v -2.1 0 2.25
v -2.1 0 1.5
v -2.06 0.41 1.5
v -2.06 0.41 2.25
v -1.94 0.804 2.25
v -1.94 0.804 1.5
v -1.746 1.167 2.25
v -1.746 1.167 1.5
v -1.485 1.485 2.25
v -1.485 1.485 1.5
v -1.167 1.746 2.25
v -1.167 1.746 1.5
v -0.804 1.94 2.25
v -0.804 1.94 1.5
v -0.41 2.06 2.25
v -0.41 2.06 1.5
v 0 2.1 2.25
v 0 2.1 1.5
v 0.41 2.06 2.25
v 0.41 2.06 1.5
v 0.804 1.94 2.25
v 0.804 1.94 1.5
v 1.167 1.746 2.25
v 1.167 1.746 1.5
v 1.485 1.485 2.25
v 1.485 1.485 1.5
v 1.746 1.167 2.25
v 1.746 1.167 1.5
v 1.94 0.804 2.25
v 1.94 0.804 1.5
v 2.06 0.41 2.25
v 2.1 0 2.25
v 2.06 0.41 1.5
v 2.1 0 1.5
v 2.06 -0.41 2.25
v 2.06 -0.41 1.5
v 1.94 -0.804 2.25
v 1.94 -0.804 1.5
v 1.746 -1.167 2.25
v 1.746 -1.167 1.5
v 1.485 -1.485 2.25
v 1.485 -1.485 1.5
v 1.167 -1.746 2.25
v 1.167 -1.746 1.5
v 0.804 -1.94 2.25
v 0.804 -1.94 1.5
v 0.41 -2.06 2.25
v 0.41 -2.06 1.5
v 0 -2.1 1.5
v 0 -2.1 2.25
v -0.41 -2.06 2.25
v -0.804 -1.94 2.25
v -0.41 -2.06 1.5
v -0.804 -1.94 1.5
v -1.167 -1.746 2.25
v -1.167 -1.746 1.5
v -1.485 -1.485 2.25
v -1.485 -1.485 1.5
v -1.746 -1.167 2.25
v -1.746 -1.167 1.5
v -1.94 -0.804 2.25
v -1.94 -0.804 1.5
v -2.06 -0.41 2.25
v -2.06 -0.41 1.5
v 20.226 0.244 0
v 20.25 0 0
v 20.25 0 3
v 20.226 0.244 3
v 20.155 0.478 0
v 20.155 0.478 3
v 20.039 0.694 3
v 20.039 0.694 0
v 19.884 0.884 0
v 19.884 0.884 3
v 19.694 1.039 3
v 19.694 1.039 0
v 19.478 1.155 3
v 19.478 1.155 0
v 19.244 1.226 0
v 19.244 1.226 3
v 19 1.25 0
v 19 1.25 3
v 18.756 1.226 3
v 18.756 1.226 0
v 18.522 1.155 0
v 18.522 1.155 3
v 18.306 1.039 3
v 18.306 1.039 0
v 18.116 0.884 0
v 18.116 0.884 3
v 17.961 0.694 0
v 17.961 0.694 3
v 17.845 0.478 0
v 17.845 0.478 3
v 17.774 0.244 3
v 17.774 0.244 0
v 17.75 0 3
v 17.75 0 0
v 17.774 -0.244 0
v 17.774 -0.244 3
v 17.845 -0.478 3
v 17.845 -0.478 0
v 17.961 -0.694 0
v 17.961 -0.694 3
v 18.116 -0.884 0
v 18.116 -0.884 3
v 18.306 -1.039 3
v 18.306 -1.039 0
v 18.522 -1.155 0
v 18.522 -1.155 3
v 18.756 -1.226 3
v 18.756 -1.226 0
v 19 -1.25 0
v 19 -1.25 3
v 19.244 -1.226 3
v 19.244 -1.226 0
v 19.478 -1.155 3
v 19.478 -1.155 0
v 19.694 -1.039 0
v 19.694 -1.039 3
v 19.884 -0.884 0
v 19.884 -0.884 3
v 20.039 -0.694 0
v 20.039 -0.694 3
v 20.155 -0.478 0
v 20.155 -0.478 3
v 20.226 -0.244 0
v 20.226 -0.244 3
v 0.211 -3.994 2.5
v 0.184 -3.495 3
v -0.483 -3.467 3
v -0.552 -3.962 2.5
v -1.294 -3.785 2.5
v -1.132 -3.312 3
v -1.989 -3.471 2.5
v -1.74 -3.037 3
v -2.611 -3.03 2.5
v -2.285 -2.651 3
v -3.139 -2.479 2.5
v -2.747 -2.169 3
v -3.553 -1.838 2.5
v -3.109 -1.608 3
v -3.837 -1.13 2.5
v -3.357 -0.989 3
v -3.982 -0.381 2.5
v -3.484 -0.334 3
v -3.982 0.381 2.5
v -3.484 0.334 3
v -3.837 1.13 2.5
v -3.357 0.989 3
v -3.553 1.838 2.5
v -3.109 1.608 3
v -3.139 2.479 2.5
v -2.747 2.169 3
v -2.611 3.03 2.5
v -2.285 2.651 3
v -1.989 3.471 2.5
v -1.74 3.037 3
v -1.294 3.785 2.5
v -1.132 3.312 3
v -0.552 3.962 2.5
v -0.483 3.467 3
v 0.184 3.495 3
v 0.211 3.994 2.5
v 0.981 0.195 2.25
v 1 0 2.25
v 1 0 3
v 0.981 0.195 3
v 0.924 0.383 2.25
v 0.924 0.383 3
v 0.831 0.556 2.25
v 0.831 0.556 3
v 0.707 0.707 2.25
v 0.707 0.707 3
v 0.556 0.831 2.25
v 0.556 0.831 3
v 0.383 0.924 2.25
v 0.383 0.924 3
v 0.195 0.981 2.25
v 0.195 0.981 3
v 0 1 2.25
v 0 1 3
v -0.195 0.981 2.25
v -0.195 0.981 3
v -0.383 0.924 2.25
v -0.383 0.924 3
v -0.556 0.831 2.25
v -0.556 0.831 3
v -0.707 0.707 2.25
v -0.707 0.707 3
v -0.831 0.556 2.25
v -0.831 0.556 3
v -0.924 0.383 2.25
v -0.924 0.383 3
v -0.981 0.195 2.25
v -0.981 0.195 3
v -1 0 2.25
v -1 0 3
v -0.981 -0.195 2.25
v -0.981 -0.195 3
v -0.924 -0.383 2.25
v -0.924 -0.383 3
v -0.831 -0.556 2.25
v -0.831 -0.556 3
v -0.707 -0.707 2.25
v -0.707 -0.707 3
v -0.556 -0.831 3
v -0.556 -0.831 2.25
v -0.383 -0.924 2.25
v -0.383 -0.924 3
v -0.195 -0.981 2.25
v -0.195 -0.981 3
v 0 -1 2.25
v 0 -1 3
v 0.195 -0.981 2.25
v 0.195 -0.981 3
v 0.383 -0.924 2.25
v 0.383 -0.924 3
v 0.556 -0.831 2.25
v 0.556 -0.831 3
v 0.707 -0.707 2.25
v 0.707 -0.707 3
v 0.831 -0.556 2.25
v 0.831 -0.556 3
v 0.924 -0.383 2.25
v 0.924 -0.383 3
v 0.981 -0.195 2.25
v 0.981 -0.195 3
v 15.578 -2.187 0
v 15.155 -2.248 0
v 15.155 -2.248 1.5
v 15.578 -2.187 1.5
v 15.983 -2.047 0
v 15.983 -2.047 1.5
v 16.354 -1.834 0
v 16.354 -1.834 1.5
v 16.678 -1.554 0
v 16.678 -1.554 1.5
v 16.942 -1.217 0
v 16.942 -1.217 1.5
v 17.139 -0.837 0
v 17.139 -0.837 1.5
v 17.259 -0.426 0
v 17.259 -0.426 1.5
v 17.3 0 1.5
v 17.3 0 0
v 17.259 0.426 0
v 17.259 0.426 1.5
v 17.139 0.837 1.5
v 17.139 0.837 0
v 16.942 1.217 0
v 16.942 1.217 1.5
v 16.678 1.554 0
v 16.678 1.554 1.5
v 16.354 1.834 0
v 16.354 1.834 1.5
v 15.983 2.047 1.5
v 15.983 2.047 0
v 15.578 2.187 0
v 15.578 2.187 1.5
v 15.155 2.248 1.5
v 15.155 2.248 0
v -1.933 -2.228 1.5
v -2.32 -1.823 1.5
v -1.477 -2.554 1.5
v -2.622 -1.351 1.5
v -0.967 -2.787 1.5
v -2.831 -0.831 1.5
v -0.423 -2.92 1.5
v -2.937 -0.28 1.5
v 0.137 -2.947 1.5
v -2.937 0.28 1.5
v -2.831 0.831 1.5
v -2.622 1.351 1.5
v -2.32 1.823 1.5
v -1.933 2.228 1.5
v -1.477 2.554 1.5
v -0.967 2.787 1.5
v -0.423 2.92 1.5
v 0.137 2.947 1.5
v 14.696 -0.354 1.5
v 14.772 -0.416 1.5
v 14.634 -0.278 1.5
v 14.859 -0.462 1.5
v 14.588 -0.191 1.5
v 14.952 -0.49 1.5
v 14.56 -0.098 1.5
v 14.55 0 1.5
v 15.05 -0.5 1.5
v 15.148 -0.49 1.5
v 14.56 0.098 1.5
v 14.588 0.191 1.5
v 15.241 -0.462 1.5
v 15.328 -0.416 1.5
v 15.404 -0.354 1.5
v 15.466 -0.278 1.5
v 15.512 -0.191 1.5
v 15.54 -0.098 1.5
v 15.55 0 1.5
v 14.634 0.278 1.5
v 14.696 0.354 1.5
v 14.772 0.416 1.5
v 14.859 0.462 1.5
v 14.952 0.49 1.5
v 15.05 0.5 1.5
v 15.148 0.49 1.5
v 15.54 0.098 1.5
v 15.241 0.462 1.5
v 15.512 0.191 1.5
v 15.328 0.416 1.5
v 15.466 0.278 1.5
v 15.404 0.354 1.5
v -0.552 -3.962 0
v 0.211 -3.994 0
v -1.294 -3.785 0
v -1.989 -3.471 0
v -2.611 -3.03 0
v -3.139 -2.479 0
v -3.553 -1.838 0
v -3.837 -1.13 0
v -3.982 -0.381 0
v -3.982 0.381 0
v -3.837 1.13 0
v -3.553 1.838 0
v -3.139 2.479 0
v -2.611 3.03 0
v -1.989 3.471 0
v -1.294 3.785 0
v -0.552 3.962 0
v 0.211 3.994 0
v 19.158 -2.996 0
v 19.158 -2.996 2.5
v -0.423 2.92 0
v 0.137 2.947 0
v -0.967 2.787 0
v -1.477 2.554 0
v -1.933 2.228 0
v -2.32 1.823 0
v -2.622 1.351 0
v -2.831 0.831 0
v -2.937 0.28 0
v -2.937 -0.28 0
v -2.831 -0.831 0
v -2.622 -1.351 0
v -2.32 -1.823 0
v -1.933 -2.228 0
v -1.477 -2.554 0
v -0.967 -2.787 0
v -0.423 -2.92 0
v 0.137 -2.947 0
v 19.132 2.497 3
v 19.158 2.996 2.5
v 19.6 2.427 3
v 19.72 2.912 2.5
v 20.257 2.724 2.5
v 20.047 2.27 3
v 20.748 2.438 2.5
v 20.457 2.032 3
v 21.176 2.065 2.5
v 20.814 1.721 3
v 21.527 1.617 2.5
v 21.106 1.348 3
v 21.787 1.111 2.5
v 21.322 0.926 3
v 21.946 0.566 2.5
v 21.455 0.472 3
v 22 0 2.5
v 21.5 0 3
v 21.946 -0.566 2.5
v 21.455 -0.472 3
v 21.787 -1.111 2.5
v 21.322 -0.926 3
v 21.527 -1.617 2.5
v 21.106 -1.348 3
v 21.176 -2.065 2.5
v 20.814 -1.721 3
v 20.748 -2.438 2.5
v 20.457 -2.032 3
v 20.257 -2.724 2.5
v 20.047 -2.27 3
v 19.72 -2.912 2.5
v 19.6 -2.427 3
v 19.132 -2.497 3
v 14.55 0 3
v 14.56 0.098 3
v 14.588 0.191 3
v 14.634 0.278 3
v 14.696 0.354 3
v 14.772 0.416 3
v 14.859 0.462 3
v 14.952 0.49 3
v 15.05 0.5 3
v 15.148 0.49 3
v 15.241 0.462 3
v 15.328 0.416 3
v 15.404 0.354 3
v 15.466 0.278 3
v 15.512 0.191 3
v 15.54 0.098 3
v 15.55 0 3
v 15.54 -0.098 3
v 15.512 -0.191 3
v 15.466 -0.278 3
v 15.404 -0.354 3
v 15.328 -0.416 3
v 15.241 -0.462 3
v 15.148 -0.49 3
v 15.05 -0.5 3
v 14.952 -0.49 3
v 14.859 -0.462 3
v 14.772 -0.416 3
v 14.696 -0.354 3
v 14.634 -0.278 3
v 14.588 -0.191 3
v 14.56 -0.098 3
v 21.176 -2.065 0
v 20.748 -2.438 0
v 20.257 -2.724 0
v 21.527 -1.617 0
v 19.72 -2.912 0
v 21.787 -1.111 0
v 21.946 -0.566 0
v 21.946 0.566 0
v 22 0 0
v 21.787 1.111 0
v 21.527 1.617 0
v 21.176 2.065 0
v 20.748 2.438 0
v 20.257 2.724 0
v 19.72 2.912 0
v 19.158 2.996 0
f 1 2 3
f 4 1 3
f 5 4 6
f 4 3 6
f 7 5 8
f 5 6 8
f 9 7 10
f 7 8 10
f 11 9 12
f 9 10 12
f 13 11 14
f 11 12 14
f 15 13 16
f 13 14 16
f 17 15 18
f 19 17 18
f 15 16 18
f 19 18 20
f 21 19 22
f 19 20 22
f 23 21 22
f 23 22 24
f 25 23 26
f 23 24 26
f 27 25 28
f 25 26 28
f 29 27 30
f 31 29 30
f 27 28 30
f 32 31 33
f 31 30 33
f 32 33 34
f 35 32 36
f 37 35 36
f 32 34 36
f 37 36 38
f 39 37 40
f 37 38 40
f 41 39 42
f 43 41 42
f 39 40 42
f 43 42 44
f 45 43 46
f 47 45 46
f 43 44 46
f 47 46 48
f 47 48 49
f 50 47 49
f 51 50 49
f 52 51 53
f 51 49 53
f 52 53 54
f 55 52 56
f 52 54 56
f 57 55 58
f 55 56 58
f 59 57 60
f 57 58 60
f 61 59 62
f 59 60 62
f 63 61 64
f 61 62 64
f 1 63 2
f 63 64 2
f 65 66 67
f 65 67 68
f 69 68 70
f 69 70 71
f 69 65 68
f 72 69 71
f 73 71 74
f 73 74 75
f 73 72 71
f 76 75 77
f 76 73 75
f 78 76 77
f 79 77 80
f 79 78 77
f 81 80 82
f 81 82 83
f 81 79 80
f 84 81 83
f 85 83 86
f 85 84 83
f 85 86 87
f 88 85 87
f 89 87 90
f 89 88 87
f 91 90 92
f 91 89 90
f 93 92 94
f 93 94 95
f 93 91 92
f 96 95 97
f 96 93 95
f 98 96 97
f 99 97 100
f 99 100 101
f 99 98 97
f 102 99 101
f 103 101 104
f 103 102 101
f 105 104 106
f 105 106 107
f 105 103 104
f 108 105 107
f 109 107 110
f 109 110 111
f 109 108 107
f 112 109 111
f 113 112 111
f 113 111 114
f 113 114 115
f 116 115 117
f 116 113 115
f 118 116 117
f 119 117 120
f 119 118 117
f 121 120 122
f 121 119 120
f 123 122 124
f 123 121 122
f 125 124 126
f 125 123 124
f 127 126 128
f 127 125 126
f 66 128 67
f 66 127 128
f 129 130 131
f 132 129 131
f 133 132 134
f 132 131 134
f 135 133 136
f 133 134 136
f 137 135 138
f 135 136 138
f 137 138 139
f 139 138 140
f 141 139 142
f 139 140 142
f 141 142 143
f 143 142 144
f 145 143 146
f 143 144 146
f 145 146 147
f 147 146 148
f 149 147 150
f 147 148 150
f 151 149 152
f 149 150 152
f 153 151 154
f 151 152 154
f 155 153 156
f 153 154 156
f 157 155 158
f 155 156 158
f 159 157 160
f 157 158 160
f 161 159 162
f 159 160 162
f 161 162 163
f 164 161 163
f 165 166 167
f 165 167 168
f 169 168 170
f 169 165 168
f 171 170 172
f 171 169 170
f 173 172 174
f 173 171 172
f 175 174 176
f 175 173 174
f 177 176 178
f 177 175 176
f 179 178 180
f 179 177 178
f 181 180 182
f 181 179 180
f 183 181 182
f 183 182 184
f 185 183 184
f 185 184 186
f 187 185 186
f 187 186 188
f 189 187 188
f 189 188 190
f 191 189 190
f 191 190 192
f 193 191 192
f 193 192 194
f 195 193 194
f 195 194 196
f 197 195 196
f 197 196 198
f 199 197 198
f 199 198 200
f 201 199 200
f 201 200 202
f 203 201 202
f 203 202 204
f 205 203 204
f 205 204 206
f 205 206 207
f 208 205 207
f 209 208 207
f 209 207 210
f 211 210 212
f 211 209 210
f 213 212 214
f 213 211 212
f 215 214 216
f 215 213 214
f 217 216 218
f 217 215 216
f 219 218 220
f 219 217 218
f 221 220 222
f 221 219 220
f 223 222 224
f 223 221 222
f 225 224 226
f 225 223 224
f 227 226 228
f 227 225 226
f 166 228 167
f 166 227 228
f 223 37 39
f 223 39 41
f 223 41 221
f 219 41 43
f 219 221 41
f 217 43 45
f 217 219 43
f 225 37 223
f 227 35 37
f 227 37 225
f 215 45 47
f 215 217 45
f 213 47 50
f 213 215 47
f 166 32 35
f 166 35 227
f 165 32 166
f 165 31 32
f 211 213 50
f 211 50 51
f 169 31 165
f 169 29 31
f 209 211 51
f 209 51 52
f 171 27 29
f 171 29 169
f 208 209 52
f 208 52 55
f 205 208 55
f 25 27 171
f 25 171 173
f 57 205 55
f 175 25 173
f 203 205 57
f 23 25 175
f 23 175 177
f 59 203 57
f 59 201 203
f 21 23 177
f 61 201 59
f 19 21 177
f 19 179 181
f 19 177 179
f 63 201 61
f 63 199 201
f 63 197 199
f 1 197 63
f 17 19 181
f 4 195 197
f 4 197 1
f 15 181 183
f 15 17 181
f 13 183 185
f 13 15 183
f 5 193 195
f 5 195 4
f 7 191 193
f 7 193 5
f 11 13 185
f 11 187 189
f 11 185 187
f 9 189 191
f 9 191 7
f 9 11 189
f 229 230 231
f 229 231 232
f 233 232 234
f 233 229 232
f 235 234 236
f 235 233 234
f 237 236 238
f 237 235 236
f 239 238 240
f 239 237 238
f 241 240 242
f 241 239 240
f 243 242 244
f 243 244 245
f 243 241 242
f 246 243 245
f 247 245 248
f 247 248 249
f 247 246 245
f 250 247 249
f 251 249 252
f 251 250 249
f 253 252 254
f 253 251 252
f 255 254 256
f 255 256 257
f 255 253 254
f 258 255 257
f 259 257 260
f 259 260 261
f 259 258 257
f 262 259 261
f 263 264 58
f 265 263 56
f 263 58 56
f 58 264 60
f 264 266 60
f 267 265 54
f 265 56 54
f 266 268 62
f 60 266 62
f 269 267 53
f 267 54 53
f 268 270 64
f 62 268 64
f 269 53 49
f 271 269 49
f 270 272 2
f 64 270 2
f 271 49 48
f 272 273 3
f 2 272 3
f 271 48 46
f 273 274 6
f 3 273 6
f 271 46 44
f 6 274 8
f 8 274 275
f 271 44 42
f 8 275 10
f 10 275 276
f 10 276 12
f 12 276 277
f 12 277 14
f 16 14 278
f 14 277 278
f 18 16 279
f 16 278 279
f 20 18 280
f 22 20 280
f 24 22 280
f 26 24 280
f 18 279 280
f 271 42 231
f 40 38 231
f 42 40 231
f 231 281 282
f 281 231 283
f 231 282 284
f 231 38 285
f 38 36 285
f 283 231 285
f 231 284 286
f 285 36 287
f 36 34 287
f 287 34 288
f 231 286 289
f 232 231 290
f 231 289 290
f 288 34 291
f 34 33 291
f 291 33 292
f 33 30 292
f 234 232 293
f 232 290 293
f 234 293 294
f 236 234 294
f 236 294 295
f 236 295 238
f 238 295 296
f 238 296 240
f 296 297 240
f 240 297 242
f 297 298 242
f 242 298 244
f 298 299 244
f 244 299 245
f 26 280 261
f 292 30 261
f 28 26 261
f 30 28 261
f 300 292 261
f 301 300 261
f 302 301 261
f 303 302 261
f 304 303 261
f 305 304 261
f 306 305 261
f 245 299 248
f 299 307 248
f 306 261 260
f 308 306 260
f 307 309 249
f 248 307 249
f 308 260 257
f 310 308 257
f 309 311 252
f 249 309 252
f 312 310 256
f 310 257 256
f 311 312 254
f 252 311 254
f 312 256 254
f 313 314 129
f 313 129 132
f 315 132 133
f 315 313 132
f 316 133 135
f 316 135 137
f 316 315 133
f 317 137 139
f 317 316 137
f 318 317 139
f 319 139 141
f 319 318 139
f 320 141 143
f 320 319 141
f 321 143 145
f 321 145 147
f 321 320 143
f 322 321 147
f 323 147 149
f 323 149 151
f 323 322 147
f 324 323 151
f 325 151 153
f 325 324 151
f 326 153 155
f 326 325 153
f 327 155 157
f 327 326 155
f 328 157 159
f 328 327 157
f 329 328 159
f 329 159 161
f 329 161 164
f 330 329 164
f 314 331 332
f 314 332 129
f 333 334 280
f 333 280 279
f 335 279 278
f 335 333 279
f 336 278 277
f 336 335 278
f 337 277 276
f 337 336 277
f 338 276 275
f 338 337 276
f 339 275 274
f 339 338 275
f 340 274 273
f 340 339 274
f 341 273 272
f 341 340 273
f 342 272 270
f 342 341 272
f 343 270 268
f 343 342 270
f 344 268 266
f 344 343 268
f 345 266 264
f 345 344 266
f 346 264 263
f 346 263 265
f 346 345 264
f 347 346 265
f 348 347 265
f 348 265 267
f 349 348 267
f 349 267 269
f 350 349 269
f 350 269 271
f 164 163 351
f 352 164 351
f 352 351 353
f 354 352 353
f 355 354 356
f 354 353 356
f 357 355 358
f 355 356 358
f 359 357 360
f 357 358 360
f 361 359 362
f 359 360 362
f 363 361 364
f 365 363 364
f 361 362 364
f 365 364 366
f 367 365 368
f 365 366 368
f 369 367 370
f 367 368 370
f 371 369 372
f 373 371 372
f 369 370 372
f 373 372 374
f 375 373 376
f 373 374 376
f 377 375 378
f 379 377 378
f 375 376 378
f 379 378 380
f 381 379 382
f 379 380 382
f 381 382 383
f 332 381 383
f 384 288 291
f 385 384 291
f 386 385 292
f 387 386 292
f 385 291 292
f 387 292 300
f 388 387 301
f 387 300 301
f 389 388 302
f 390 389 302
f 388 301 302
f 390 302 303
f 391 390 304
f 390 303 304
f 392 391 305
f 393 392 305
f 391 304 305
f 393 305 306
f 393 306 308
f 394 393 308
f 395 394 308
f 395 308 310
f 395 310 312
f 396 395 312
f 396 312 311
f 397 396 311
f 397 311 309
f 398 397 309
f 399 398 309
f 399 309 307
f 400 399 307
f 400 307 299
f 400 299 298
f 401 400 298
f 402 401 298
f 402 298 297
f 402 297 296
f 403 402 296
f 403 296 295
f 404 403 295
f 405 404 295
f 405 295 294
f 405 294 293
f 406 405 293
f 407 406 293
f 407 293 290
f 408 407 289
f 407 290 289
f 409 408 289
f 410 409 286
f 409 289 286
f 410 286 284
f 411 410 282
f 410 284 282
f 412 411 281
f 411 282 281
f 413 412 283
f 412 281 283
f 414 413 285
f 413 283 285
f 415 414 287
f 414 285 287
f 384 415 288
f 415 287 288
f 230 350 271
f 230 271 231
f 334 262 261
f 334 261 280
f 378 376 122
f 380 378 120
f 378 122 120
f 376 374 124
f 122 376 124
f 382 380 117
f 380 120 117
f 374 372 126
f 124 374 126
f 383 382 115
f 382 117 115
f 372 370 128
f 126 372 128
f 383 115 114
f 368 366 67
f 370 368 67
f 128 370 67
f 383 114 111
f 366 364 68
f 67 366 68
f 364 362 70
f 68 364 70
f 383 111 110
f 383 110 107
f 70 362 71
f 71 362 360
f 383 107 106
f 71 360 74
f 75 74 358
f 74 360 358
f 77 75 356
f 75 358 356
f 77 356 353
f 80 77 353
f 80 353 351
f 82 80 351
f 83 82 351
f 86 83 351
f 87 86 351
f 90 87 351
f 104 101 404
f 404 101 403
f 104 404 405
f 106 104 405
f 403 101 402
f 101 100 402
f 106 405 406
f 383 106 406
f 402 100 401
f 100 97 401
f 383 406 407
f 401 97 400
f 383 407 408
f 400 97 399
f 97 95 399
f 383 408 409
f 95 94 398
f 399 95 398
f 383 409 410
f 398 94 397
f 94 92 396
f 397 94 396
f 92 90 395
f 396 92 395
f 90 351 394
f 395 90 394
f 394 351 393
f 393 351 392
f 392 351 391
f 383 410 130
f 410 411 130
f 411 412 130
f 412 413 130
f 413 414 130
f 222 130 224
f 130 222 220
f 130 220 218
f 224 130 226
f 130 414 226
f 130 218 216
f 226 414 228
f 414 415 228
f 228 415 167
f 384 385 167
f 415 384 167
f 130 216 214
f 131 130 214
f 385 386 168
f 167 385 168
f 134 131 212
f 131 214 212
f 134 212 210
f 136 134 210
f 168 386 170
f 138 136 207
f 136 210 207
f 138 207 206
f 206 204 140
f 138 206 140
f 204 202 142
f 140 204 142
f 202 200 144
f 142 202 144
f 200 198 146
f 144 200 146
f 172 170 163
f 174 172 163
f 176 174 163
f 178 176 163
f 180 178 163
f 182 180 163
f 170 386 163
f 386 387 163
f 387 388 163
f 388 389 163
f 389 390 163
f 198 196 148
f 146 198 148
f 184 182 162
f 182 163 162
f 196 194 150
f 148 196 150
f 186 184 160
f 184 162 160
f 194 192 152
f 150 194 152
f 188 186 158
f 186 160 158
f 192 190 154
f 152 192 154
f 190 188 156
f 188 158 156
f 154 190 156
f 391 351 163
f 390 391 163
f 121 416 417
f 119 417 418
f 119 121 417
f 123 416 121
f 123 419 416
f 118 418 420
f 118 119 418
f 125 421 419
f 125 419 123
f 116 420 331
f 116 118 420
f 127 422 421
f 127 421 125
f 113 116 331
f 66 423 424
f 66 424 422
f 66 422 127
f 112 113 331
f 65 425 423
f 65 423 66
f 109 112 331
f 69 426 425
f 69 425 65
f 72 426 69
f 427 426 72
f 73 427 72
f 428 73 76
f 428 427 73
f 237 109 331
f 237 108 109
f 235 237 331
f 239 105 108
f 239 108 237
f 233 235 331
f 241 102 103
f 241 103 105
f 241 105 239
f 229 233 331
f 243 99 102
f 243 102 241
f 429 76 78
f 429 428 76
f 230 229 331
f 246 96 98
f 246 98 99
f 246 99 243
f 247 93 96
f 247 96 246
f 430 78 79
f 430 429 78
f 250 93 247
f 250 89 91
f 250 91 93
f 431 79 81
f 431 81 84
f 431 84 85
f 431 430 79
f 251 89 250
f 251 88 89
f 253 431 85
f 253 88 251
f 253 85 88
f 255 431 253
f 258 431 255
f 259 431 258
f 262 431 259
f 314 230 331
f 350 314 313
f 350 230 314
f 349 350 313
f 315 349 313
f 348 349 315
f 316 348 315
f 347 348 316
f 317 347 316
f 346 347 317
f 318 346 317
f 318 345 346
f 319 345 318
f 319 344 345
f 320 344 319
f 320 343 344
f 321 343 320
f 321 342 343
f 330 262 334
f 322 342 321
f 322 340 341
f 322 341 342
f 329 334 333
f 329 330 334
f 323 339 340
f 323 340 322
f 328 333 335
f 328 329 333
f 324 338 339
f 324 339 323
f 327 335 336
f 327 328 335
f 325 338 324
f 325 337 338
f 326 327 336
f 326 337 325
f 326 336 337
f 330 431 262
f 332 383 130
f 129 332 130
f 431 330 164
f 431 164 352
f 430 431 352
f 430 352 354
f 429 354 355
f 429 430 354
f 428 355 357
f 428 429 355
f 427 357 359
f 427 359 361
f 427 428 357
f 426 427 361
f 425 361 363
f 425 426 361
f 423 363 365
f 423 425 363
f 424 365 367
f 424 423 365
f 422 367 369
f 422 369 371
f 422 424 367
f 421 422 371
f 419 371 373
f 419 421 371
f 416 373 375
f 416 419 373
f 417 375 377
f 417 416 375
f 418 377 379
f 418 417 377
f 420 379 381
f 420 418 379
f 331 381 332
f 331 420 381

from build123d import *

# Parameters (mm, degrees)
CROQUIS1_R              = 1
CROQUIS1_R_2            = 1.25
SALIENTE_EXTRUIR1_DEPTH = 3
CORTAR_EXTRUIR1_DEPTH   = 1.5
CROQUIS3_R              = 2.1
CORTAR_EXTRUIR2_DEPTH   = 0.75
CROQUIS4_R              = 0.5
CORTAR_EXTRUIR3_DEPTH   = 23.410934831
CHAFL_N1_SIZE           = 0.5


with BuildPart() as part:
    # Croquis1 → Saliente-Extruir1 (new body)
    with BuildSketch(Plane.XY):
        with BuildLine():
            Line((0.210526316, 3.994455992), (19.157894737, 2.995841994))
            ThreePointArc((19.157894737, 2.995841994), (22, 0), (19.157894737, -2.995841994))
            Line((19.157894737, -2.995841994), (0.210526316, -3.994455992))
            ThreePointArc((0.210526316, -3.994455992), (-4, 0), (0.210526316, 3.994455992))
        make_face()
        Circle(CROQUIS1_R, mode=Mode.SUBTRACT)
        with Locations((19, 0)):
            Circle(CROQUIS1_R_2, mode=Mode.SUBTRACT)
    extrude(amount=SALIENTE_EXTRUIR1_DEPTH)

    # Croquis2 → Cortar-Extruir1 (cut)
    with BuildSketch(Plane(origin=(0, 0, 0), x_dir=(-1, 0, 0), z_dir=(0, 0, -1))):
        with BuildLine():
            Line((-15.154651163, 2.247564934), (-0.137209302, 2.946807358))
            ThreePointArc((-0.137209302, 2.946807358), (2.95, 0), (-0.137209302, -2.946807358))
            Line((-0.137209302, -2.946807358), (-15.154651163, -2.247564934))
            ThreePointArc((-15.154651163, -2.247564934), (-17.3, 0), (-15.154651163, 2.247564934))
        make_face()
    extrude(amount=-CORTAR_EXTRUIR1_DEPTH, mode=Mode.SUBTRACT)

    # Croquis3 → Cortar-Extruir2 (cut)
    with BuildSketch(Plane(origin=(0, 0, 1.5), x_dir=(-1, 0, 0), z_dir=(0, 0, -1))):
        Circle(CROQUIS3_R)
    extrude(amount=-CORTAR_EXTRUIR2_DEPTH, mode=Mode.SUBTRACT)

    # Croquis4 → Cortar-Extruir3 (cut, through all)
    with BuildSketch(Plane(origin=(0, 0, 1.5), x_dir=(-1, 0, 0), z_dir=(0, 0, -1))):
        with Locations((-15.05, 0)):
            Circle(CROQUIS4_R)
    extrude(amount=-CORTAR_EXTRUIR3_DEPTH, mode=Mode.SUBTRACT)

    # Chaflán1
    chafl_n1_edges = [part.edges().sort_by_distance(p)[0] for p in [
        (22, 0, 3),
        (9.684210526, 3.495148993, 3),
        (-4, 0, 3),
        (9.684210526, -3.495148993, 3),
    ]]
    chamfer(chafl_n1_edges, length=CHAFL_N1_SIZE)


solid = part.part
